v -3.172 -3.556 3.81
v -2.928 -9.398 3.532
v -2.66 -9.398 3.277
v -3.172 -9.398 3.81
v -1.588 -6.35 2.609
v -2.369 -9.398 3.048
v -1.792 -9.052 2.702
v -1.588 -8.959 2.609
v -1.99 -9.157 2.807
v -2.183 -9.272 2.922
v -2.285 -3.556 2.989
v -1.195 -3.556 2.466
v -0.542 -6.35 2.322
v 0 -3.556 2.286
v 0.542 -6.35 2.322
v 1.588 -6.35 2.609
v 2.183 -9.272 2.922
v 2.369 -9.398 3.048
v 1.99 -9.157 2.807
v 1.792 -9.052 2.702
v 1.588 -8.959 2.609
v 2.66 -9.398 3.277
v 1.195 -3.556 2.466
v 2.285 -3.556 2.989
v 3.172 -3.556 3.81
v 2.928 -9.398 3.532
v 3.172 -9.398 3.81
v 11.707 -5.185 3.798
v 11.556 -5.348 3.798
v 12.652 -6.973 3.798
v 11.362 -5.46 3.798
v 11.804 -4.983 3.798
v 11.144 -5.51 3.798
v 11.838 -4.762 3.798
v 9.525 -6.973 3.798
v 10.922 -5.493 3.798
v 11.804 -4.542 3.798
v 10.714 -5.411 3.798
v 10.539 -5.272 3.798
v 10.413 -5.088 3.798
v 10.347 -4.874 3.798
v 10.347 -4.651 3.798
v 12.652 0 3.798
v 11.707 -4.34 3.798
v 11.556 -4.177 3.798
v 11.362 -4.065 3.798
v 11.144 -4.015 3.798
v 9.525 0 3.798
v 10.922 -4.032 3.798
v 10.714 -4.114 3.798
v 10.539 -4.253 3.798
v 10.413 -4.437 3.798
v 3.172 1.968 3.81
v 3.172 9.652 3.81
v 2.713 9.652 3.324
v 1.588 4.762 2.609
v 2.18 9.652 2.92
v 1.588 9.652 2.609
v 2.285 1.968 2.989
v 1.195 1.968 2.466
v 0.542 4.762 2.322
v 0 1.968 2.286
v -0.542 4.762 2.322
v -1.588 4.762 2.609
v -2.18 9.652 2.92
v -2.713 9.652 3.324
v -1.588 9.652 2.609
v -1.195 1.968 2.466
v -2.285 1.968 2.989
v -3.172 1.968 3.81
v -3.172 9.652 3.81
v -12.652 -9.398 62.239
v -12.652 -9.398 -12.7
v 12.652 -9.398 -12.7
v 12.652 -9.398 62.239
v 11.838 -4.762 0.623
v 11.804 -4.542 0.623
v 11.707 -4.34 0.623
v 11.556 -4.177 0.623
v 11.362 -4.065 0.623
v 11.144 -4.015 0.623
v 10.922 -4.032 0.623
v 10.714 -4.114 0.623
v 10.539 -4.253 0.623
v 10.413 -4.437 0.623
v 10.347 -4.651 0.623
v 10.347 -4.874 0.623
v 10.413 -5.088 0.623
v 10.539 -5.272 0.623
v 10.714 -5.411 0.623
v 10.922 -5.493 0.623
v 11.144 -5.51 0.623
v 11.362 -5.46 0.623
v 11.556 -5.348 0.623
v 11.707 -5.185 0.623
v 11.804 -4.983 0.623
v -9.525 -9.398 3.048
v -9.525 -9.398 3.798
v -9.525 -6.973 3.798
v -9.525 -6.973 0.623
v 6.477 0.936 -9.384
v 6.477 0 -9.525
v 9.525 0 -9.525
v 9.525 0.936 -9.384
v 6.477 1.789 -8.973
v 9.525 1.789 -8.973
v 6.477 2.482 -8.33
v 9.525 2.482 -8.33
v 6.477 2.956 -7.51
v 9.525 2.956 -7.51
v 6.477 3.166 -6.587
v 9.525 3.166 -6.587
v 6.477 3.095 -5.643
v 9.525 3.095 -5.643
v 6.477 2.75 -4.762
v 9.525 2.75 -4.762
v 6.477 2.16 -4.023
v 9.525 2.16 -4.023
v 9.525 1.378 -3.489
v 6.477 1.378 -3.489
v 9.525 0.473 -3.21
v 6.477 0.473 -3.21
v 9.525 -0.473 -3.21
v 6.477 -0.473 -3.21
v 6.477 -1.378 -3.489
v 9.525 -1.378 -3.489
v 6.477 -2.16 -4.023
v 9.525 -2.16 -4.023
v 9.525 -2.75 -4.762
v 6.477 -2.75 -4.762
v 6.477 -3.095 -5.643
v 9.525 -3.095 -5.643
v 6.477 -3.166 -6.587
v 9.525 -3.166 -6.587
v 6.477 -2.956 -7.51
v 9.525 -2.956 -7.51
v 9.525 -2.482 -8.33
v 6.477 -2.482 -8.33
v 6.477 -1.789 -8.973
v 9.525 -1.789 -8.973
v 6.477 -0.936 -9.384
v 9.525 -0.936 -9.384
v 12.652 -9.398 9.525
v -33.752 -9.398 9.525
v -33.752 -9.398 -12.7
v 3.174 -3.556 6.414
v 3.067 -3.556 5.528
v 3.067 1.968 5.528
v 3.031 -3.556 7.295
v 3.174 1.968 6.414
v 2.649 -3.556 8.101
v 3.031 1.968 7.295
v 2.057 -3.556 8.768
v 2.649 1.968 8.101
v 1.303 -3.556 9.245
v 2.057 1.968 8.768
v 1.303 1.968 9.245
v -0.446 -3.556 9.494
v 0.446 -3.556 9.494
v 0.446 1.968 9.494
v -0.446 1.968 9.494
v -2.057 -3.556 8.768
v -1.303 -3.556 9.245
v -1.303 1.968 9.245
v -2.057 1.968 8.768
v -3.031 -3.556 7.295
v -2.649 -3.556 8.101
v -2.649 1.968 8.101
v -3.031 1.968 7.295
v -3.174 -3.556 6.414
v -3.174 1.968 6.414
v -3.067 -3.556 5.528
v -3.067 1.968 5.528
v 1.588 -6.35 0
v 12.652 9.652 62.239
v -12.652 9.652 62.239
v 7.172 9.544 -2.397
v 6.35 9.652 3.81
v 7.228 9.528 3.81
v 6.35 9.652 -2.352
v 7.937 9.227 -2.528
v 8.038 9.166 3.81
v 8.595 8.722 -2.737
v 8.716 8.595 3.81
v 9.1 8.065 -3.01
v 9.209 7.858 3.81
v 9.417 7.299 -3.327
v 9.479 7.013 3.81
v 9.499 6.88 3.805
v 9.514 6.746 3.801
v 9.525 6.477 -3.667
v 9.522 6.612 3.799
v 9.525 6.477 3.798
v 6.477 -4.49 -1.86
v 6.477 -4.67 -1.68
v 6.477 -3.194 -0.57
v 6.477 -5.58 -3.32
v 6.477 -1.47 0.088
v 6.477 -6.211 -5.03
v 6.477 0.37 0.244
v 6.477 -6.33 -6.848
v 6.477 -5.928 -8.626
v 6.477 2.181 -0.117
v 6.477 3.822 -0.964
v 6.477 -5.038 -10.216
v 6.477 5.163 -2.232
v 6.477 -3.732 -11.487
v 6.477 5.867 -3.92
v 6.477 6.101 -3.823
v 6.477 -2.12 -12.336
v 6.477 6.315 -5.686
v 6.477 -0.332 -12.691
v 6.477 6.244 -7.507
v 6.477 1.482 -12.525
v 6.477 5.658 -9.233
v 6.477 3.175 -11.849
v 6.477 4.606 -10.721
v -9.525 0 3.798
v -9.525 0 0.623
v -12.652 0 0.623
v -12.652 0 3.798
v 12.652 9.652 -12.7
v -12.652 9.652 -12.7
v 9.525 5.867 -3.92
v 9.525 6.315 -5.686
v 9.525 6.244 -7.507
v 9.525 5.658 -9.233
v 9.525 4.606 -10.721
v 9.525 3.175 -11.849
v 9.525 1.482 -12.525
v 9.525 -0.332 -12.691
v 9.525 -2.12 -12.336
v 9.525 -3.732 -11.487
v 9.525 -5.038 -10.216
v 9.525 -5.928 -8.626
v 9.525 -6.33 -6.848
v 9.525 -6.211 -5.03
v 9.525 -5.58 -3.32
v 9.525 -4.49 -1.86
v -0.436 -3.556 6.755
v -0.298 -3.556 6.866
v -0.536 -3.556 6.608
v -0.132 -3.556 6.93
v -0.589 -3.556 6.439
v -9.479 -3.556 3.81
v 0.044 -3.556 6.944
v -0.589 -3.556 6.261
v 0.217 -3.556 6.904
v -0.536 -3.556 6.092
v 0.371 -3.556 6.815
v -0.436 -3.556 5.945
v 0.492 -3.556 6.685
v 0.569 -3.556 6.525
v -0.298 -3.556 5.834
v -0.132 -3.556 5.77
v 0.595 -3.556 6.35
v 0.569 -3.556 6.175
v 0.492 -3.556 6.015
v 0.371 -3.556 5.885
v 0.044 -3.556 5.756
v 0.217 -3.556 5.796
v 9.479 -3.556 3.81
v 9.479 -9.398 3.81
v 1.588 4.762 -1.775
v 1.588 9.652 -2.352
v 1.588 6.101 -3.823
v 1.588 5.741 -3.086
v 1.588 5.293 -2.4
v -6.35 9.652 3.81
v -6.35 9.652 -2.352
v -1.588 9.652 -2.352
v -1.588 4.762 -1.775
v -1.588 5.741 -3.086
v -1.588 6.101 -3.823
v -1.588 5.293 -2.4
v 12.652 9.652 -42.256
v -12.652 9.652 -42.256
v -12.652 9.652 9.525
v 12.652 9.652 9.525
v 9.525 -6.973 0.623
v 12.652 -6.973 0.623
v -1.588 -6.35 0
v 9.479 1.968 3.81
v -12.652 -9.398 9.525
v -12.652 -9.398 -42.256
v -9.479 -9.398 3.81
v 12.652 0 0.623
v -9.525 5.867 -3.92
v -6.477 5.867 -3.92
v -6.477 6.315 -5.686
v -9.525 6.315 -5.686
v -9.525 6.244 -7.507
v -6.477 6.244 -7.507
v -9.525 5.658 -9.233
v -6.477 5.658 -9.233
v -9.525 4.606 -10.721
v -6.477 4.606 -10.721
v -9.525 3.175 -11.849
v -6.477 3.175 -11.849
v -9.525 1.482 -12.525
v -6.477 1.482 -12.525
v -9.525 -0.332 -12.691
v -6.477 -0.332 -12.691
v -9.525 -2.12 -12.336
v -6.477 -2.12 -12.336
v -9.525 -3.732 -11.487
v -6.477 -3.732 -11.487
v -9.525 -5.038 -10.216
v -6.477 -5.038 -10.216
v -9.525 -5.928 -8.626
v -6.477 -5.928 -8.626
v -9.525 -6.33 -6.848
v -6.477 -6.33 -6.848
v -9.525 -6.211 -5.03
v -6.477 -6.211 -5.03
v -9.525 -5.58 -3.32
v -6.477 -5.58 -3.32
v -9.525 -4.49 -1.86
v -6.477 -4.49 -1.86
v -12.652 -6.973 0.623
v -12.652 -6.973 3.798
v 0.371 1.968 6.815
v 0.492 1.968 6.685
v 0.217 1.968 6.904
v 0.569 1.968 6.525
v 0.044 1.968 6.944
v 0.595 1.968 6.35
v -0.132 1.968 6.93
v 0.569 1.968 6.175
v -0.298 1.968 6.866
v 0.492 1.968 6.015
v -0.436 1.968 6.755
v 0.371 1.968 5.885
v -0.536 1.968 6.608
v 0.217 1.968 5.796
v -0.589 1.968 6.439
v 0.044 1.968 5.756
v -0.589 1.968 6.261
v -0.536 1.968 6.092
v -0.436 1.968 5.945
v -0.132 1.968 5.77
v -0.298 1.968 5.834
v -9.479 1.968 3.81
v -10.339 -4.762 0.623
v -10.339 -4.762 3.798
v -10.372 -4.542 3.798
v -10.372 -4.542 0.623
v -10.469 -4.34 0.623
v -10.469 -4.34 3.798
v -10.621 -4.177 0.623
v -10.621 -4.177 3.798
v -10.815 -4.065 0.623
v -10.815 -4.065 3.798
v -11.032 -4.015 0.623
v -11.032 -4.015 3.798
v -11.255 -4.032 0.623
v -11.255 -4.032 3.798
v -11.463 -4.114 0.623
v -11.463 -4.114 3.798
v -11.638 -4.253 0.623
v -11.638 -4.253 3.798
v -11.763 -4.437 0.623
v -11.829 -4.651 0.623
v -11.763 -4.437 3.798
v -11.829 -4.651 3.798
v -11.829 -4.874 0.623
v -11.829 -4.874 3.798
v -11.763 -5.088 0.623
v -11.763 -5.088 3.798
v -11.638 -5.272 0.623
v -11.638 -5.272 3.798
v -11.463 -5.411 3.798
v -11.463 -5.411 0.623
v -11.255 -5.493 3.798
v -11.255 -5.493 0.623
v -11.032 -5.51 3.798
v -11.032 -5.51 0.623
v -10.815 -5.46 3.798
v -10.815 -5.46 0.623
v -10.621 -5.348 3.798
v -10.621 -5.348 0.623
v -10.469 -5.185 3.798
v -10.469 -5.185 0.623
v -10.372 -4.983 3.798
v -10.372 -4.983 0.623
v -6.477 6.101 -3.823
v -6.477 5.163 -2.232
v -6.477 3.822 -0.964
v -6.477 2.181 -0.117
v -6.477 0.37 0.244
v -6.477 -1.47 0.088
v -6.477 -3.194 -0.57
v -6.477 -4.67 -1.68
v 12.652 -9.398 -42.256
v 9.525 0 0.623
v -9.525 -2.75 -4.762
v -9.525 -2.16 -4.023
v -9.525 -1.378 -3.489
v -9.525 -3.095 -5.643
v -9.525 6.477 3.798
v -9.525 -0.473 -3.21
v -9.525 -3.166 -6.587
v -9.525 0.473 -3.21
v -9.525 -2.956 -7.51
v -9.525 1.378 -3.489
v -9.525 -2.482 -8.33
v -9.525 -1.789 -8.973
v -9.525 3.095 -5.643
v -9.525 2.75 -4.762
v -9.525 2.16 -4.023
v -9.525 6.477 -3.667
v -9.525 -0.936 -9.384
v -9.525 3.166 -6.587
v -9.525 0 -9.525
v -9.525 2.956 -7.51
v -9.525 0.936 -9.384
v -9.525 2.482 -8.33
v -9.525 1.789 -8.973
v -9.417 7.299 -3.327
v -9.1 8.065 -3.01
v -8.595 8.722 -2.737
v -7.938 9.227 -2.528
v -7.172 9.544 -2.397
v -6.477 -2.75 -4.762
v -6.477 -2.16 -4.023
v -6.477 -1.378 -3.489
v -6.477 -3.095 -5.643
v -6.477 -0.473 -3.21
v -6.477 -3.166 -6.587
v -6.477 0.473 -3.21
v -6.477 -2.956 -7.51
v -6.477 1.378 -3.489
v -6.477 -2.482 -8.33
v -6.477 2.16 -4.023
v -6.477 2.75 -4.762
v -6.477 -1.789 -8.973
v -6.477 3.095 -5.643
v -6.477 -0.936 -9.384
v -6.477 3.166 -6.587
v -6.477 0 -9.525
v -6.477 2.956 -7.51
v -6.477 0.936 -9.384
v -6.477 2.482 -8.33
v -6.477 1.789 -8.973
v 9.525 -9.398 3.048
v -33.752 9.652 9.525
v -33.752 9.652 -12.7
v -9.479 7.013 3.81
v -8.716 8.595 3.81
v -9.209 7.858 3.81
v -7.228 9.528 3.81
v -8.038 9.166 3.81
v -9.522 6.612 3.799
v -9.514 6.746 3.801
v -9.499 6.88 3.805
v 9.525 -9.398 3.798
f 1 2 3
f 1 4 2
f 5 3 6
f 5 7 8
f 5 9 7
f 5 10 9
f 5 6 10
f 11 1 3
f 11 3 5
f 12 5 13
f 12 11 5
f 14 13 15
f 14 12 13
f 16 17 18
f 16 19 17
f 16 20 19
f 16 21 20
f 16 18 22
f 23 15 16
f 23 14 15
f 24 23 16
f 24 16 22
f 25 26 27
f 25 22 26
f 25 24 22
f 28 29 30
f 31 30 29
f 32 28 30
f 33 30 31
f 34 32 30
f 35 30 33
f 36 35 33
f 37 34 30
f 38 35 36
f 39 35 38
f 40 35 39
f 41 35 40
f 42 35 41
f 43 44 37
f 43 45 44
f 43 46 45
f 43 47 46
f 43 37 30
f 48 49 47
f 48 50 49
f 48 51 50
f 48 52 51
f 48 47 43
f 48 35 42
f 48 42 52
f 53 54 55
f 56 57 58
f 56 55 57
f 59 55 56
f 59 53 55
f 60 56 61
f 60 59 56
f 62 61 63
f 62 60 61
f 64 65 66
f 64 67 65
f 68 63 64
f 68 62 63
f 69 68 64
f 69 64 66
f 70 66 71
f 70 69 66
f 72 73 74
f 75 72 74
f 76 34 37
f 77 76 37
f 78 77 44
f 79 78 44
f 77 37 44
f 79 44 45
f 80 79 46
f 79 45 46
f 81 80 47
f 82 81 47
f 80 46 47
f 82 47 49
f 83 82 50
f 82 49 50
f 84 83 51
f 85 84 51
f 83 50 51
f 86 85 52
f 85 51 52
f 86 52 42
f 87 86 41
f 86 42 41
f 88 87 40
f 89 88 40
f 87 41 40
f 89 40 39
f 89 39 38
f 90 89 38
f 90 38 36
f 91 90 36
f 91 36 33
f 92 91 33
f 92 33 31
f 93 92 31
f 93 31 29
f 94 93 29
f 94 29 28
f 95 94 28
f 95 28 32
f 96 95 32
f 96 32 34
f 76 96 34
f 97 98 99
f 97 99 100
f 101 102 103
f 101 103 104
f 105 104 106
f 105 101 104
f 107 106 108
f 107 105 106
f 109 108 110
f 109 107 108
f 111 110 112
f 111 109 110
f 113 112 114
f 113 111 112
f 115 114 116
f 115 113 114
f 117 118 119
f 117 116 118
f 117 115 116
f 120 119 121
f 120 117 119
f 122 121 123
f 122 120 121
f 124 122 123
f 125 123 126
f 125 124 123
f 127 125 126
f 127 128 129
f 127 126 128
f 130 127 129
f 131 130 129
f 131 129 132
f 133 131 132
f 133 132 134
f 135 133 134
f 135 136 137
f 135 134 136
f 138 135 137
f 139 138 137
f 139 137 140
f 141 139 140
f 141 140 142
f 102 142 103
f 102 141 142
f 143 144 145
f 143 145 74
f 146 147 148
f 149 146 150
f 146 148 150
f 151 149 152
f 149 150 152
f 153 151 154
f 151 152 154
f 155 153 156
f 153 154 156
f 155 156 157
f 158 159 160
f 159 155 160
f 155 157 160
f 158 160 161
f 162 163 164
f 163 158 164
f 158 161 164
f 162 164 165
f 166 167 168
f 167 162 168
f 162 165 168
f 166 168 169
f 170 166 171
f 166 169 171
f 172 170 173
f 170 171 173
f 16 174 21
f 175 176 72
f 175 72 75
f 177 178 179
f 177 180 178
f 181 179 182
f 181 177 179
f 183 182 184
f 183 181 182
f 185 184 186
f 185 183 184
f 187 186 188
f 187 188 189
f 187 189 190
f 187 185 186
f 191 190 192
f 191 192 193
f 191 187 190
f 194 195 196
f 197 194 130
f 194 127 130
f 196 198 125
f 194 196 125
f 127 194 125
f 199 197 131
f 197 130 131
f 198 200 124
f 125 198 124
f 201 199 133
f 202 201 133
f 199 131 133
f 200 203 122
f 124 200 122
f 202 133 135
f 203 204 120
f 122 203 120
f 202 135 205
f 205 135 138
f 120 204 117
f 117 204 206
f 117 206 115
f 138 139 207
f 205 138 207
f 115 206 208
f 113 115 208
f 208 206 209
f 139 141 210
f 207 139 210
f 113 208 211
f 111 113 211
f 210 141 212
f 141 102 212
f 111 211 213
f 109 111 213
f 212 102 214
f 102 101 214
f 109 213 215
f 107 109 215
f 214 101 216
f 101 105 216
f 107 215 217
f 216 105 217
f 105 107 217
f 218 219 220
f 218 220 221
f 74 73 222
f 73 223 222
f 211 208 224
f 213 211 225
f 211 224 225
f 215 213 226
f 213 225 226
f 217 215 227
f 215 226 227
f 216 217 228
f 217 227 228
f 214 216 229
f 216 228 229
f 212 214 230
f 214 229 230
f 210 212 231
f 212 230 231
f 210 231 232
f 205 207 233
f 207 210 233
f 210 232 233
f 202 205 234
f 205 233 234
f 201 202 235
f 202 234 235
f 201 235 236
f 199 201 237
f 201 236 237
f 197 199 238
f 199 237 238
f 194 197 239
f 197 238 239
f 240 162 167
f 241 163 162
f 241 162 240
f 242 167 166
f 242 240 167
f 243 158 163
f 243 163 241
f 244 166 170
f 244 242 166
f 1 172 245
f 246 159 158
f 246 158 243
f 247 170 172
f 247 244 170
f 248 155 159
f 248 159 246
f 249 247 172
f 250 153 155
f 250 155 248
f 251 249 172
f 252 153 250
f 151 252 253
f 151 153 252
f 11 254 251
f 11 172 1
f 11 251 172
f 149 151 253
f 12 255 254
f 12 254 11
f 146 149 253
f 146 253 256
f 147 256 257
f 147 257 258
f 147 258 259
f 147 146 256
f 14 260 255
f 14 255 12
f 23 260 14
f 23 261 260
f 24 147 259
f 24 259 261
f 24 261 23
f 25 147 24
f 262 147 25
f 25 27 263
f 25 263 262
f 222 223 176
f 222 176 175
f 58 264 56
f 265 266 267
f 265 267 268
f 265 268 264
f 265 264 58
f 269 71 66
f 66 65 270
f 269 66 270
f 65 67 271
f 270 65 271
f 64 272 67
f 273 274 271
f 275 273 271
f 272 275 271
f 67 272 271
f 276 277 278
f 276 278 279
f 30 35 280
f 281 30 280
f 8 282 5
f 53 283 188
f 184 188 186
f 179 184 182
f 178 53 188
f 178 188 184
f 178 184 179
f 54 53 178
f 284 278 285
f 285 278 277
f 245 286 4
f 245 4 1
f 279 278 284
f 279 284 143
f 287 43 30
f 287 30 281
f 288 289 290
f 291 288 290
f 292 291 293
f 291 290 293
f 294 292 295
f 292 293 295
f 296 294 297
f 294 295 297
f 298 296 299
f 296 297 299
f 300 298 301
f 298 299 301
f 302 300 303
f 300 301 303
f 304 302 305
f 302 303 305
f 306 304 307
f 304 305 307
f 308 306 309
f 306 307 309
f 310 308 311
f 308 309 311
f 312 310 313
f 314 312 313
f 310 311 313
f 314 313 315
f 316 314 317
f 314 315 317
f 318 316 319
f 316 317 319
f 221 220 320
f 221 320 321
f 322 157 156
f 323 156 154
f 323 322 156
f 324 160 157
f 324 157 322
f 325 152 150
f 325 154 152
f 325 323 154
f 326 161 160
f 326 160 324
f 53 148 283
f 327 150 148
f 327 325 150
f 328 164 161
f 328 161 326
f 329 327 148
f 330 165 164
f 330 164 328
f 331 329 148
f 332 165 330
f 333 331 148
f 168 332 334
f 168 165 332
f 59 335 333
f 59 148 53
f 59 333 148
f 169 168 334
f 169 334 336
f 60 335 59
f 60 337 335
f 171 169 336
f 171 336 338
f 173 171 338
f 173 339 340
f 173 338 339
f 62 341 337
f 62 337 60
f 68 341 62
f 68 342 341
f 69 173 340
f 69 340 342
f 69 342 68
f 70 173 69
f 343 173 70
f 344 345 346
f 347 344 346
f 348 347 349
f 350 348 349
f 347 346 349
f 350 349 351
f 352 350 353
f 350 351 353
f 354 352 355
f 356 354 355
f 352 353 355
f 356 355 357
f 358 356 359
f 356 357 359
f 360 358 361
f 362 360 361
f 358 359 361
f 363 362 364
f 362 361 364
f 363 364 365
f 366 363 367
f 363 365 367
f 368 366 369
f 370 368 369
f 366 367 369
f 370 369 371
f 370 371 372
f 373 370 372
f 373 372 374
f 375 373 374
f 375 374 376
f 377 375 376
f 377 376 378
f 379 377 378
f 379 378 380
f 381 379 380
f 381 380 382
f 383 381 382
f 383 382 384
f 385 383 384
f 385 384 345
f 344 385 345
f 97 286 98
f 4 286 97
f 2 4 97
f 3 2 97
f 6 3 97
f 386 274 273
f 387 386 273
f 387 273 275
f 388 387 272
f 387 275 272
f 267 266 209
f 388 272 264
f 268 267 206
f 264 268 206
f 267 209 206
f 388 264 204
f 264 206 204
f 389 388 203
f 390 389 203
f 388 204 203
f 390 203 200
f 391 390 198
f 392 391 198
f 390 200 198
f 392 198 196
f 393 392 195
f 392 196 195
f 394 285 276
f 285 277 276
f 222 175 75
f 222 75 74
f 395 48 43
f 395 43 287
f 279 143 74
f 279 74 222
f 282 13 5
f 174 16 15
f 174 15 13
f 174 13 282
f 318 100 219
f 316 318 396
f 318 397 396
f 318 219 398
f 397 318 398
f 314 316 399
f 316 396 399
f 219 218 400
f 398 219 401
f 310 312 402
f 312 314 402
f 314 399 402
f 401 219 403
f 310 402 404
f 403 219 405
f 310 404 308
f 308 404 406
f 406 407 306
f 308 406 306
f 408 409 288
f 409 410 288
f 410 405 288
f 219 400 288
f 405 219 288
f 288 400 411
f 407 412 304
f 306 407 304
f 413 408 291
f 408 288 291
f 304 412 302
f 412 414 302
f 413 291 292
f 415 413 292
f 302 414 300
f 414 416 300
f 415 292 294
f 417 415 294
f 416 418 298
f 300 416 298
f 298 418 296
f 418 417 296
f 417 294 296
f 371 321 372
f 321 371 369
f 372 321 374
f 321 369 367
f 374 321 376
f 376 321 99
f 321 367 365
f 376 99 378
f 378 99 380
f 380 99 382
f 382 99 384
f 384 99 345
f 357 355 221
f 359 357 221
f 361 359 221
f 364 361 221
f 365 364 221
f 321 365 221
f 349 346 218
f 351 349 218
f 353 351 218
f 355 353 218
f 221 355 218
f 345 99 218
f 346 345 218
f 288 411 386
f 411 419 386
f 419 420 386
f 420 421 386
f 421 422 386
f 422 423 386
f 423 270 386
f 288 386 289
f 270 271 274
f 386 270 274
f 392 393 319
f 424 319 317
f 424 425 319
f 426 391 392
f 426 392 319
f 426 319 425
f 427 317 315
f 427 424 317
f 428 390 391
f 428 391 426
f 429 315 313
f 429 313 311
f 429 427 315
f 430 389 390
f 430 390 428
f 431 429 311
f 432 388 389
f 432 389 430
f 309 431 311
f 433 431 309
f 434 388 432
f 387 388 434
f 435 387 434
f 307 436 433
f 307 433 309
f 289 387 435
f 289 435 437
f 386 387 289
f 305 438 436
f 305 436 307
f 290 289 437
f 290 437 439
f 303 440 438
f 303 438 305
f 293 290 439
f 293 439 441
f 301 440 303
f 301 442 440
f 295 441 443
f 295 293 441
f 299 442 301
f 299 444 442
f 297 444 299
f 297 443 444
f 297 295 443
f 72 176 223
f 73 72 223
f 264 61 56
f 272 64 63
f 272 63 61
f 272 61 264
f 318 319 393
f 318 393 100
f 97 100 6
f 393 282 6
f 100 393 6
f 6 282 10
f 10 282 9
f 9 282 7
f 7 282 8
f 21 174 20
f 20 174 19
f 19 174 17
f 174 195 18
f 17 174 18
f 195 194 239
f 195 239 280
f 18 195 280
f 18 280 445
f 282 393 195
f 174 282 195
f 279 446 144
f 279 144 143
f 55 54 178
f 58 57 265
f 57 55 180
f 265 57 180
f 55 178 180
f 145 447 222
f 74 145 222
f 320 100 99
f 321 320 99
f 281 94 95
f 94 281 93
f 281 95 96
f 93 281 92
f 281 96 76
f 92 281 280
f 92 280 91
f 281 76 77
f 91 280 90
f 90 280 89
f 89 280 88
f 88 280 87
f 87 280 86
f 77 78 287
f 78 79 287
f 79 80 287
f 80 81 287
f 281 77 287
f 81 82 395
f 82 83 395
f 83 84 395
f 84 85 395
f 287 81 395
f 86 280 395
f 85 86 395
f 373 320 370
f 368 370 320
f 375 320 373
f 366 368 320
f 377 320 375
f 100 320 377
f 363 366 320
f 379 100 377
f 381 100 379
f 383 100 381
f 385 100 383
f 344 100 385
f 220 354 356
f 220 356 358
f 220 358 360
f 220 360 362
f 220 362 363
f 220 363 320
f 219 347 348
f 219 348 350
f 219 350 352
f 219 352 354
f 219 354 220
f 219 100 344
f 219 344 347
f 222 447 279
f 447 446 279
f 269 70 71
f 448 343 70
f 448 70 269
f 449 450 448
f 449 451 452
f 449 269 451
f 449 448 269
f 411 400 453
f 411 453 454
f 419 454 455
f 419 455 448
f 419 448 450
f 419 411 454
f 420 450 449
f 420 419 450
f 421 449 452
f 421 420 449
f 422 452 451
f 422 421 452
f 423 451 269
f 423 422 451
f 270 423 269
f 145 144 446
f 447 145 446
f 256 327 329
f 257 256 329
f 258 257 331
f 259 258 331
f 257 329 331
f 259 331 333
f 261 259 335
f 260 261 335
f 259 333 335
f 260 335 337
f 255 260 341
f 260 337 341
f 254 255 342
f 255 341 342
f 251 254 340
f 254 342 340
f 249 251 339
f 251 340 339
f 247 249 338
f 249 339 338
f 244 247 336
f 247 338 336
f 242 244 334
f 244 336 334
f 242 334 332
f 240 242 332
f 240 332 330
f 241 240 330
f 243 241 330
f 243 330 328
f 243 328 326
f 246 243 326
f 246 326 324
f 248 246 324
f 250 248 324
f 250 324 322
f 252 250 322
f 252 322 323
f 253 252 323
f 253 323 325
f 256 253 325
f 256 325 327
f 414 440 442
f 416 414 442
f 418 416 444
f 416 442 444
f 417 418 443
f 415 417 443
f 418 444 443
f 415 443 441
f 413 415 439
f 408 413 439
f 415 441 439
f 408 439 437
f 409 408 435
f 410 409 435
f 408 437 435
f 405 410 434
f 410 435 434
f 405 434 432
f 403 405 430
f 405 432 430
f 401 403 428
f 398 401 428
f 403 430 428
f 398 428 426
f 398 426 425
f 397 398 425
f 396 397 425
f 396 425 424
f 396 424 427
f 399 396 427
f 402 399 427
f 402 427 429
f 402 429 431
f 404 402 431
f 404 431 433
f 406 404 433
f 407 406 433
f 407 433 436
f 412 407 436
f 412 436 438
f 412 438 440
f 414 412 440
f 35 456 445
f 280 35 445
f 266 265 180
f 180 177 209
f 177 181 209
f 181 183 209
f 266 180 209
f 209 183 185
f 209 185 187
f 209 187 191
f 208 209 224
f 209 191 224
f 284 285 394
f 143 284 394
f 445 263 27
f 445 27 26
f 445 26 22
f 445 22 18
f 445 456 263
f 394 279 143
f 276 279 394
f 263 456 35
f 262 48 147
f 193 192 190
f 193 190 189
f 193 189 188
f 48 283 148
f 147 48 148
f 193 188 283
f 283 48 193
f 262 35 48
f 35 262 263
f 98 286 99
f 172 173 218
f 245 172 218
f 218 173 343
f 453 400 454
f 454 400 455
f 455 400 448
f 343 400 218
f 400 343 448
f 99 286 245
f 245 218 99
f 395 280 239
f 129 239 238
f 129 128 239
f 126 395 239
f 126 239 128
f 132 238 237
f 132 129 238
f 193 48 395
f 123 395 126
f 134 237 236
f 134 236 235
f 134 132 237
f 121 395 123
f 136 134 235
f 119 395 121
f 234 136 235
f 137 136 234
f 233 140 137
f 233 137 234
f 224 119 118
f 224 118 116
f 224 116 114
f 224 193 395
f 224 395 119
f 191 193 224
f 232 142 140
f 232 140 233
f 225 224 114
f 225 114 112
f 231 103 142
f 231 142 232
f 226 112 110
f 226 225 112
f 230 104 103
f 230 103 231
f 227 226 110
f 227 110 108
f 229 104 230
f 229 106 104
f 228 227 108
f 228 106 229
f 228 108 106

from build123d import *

# Parameters (mm, degrees)
SKETCH1_W                = 25.4
SKETCH1_H                = 19.05
BOSS_EXTRUDE1_DEPTH      = 9.525
SKETCH2_OUTSIDE_W        = 34.806
SKETCH2_OUTSIDE_H        = 28.456
CUT_EXTRUDE2_DEPTH       = 10.525
CUT_EXTRUDE2_DEPTH_BACK  = 10.525
SKETCH3_R                = 6.604
CUT_EXTRUDE3_DEPTH       = 6.477
SKETCH5_R                = 3.175
CUT_EXTRUDE5_DEPTH       = 10.525
CUT_EXTRUDE5_DEPTH_BACK  = 10.525
SKETCH4_W                = 3.175
SKETCH4_H                = 4.8895
CUT_EXTRUDE4_DEPTH       = 13.7
CUT_EXTRUDE4_DEPTH_BACK  = 13.7
CUT_EXTRUDE6_DEPTH       = 1.5875
SKETCH7_W                = 8.89
SKETCH7_H                = 4.8895
CUT_EXTRUDE7_DEPTH       = 10.525
CUT_EXTRUDE7_DEPTH_BACK  = 10.525
SKETCH8_W                = 8.89
SKETCH8_H                = 2.794
SKETCH8_H_2              = 5.842
CUT_EXTRUDE8_DEPTH       = 10.525
CUT_EXTRUDE8_DEPTH_BACK  = 10.525
CUT_EXTRUDE9_DEPTH       = 8.6835
CUT_EXTRUDE9_DEPTH_BACK  = 12.3665
SKETCH11_R               = 0.5953125
CUT_EXTRUDE11_DEPTH      = 12.3665
FILLET1_R                = 3.175
SKETCH15_R               = 4.064
CUT_EXTRUDE12_DEPTH      = 6.842
SKETCH22_R               = 4.064
CUT_EXTRUDE15_DEPTH      = 8.6835
SKETCH16_W               = 3.175
SKETCH16_H               = 6.972783942
BOSS_EXTRUDE4_DEPTH      = 3.12674
SKETCH18_W               = 3.175
SKETCH18_H               = 6.972783942
BOSS_EXTRUDE5_DEPTH      = 3.12674
SKETCH19_R               = 0.7493
CUT_EXTRUDE13_DEPTH      = 17.497783942
SKETCH20_R               = 0.7493
CUT_EXTRUDE14_DEPTH      = 17.497783942
SKETCH26_W               = 46.403914144
SKETCH26_H               = 19.05
BOSS_EXTRUDE8_DEPTH      = 9.525
BOSS_EXTRUDE8_DEPTH_BACK = 12.7
SKETCH23_W               = 25.30348
SKETCH23_H               = 74.938767094
BOSS_EXTRUDE6_DEPTH      = 9.652
BOSS_EXTRUDE6_DEPTH_BACK = 9.398
SKETCH24_W               = 25.30348
SKETCH24_H               = 51.781364698
BOSS_EXTRUDE7_DEPTH      = 9.652
BOSS_EXTRUDE7_DEPTH_BACK = 9.398


with BuildPart() as part:
    # Sketch1 → Boss-Extrude1 (new body, symmetric)
    with BuildSketch(Plane(origin=(0, 0, 0), x_dir=(0, 0, -1), z_dir=(1, 0, 0))):
        with Locations((0, 0.127)):
            Rectangle(SKETCH1_W, SKETCH1_H)
    extrude(amount=BOSS_EXTRUDE1_DEPTH, both=True)

    # Sketch2 outside → Cut-Extrude2 (cut, two sides)
    with BuildSketch(Plane(origin=(0, 0, 0), x_dir=(0, 0, -1), z_dir=(1, 0, 0))) as cut_extrude2_sk:
        with Locations((0, 0.127)):
            Rectangle(SKETCH2_OUTSIDE_W, SKETCH2_OUTSIDE_H)
        with BuildLine():
            Line((1.859871939, -4.490128061), (-3.048, -9.398))
            Line((-3.048, -9.398), (-12.7, -9.398))
            Line((-12.7, -9.398), (-12.7, 9.652))
            Line((-12.7, 9.652), (2.352010696, 9.652))
            Line((2.352010696, 9.652), (3.919960204, 5.866635031))
            ThreePointArc((3.919960204, 5.866635031), (12.577986531, -1.238823545), (1.859871939, -4.490128061))
        make_face(mode=Mode.SUBTRACT)
    extrude(amount=CUT_EXTRUDE2_DEPTH, mode=Mode.SUBTRACT)
    extrude(cut_extrude2_sk.sketch, amount=-CUT_EXTRUDE2_DEPTH_BACK, mode=Mode.SUBTRACT)

    # Sketch3 → Cut-Extrude3 (cut, symmetric)
    with BuildSketch(Plane(origin=(0, 0, 0), x_dir=(0, 0, -1), z_dir=(1, 0, 0))):
        with Locations((6.35, 0)):
            Circle(SKETCH3_R)
    extrude(amount=CUT_EXTRUDE3_DEPTH, both=True, mode=Mode.SUBTRACT)

    # Sketch5 → Cut-Extrude5 (cut, two sides)
    with BuildSketch(Plane(origin=(0, 0, 0), x_dir=(0, 0, -1), z_dir=(1, 0, 0))) as cut_extrude5_sk:
        with Locations((6.35, 0)):
            Circle(SKETCH5_R)
    extrude(amount=CUT_EXTRUDE5_DEPTH, mode=Mode.SUBTRACT)
    extrude(cut_extrude5_sk.sketch, amount=-CUT_EXTRUDE5_DEPTH_BACK, mode=Mode.SUBTRACT)

    # Sketch4 → Cut-Extrude4 (cut, two sides)
    with BuildSketch(Plane.XY) as cut_extrude4_sk:
        with Locations((0, 7.20725)):
            Rectangle(SKETCH4_W, SKETCH4_H)
    extrude(amount=CUT_EXTRUDE4_DEPTH, mode=Mode.SUBTRACT)
    extrude(cut_extrude4_sk.sketch, amount=-CUT_EXTRUDE4_DEPTH_BACK, mode=Mode.SUBTRACT)

    # Sketch6 → Cut-Extrude6 (cut, symmetric)
    with BuildSketch(Plane(origin=(0, 0, 0), x_dir=(0, 0, -1), z_dir=(1, 0, 0))):
        Polygon((0, -6.35), (-3.048, -9.398), (-12.7, -9.398), (-12.7, -6.35), align=None)
    extrude(amount=CUT_EXTRUDE6_DEPTH, both=True, mode=Mode.SUBTRACT)

    # Sketch7 → Cut-Extrude7 (cut, two sides)
    with BuildSketch(Plane(origin=(0, 0, 0), x_dir=(0, 0, -1), z_dir=(1, 0, 0))) as cut_extrude7_sk:
        with Locations((-8.255, 7.20725)):
            Rectangle(SKETCH7_W, SKETCH7_H)
    extrude(amount=CUT_EXTRUDE7_DEPTH, mode=Mode.SUBTRACT)
    extrude(cut_extrude7_sk.sketch, amount=-CUT_EXTRUDE7_DEPTH_BACK, mode=Mode.SUBTRACT)

    # Sketch8 → Cut-Extrude8 (cut, two sides)
    with BuildSketch(Plane(origin=(0, 0, 0), x_dir=(0, 0, -1), z_dir=(1, 0, 0))) as cut_extrude8_sk:
        with Locations((-8.255, 3.3655)):
            Rectangle(SKETCH8_W, SKETCH8_H)
        with Locations((-8.255, -6.477)):
            Rectangle(SKETCH8_W, SKETCH8_H_2)
    extrude(amount=CUT_EXTRUDE8_DEPTH, mode=Mode.SUBTRACT)
    extrude(cut_extrude8_sk.sketch, amount=-CUT_EXTRUDE8_DEPTH_BACK, mode=Mode.SUBTRACT)

    # Sketch9 → Cut-Extrude9 (cut, two sides)
    with BuildSketch(Plane(origin=(0, 1.9685, 0), x_dir=(1, 0, 0), z_dir=(0, 1, 0))) as cut_extrude9_sk:
        with BuildLine():
            Line((-3.066814498, -5.528249532), (-9.525, -3.797783942))
            Line((-9.525, -3.797783942), (-9.525, -12.7))
            Line((-9.525, -12.7), (9.525, -12.7))
            Line((9.525, -12.7), (9.525, -3.797783942))
            Line((9.525, -3.797783942), (3.066814498, -5.528249532))
            ThreePointArc((3.066814498, -5.528249532), (0, -9.525), (-3.066814498, -5.528249532))
        make_face()
    extrude(amount=CUT_EXTRUDE9_DEPTH, mode=Mode.SUBTRACT)
    extrude(cut_extrude9_sk.sketch, amount=-CUT_EXTRUDE9_DEPTH_BACK, mode=Mode.SUBTRACT)

    # Sketch11 → Cut-Extrude11 (cut, through all)
    with BuildSketch(Plane(origin=(0, 1.9685, 0), x_dir=(1, 0, 0), z_dir=(0, 1, 0))):
        with Locations((0, -6.35)):
            Circle(SKETCH11_R)
    extrude(amount=-CUT_EXTRUDE11_DEPTH, mode=Mode.SUBTRACT)

    # Fillet1
    fillet1_edges = [part.edges().sort_by_distance(p)[0] for p in [
        (9.525, 9.652, 0.722886623),
        (-9.525, 9.652, 0.722886623),
    ]]
    fillet(fillet1_edges, radius=FILLET1_R)

    # Sketch15 → Cut-Extrude12 (cut, through all)
    with BuildSketch(Plane.XZ.offset(3.556)):
        with Locations((0, 6.35)):
            Circle(SKETCH15_R)
    extrude(amount=CUT_EXTRUDE12_DEPTH, mode=Mode.SUBTRACT)

    # Sketch22 → Cut-Extrude15 (cut, through all)
    with BuildSketch(Plane(origin=(0, 1.9685, 0), x_dir=(1, 0, 0), z_dir=(0, 1, 0))):
        with Locations((0, -6.35)):
            Circle(SKETCH22_R)
    extrude(amount=CUT_EXTRUDE15_DEPTH, mode=Mode.SUBTRACT)

    # Sketch16 → Boss-Extrude4 (add)
    with BuildSketch(Plane(origin=(9.525, 0, 0), x_dir=(0, 0, -1), z_dir=(1, 0, 0))):
        with Locations((-2.210283942, -3.486391971)):
            Rectangle(SKETCH16_W, SKETCH16_H)
    extrude(amount=BOSS_EXTRUDE4_DEPTH)

    # Sketch18 → Boss-Extrude5 (add)
    with BuildSketch(Plane.ZY.offset(9.525)):
        with Locations((2.210283942, -3.486391971)):
            Rectangle(SKETCH18_W, SKETCH18_H)
    extrude(amount=BOSS_EXTRUDE5_DEPTH)

    # Sketch19 → Cut-Extrude13 (cut, through all)
    with BuildSketch(Plane.XY.offset(3.797783942)):
        with Locations((11.08837, -4.7625)):
            Circle(SKETCH19_R)
    extrude(amount=-CUT_EXTRUDE13_DEPTH, mode=Mode.SUBTRACT)

    # Sketch20 → Cut-Extrude14 (cut, through all)
    with BuildSketch(Plane.XY.offset(3.797783942)):
        with Locations((-11.08837, -4.7625)):
            Circle(SKETCH20_R)
    extrude(amount=-CUT_EXTRUDE14_DEPTH, mode=Mode.SUBTRACT)


with BuildPart() as body_2:
    # Sketch26 → Boss-Extrude8 (new body, two sides)
    with BuildSketch(Plane.XY) as boss_extrude8_sk:
        with Locations((-10.550217072, 0.127)):
            Rectangle(SKETCH26_W, SKETCH26_H)
    extrude(amount=BOSS_EXTRUDE8_DEPTH)
    extrude(boss_extrude8_sk.sketch, amount=-BOSS_EXTRUDE8_DEPTH_BACK)


with BuildPart() as body_3:
    # Sketch23 → Boss-Extrude6 (new body, two sides)
    with BuildSketch(Plane(origin=(0, 0, 0), x_dir=(1, 0, 0), z_dir=(0, 1, 0))) as boss_extrude6_sk:
        with Locations((0, -24.769383547)):
            Rectangle(SKETCH23_W, SKETCH23_H)
    extrude(amount=BOSS_EXTRUDE6_DEPTH)
    extrude(boss_extrude6_sk.sketch, amount=-BOSS_EXTRUDE6_DEPTH_BACK)


with BuildPart() as body_4:
    # Sketch24 → Boss-Extrude7 (new body, two sides)
    with BuildSketch(Plane(origin=(0, 0, 0), x_dir=(1, 0, 0), z_dir=(0, 1, 0))) as boss_extrude7_sk:
        with Locations((0, 16.365682349)):
            Rectangle(SKETCH24_W, SKETCH24_H)
    extrude(amount=BOSS_EXTRUDE7_DEPTH)
    extrude(boss_extrude7_sk.sketch, amount=-BOSS_EXTRUDE7_DEPTH_BACK)


solid = Compound([part.part, body_2.part, body_3.part, body_4.part])
